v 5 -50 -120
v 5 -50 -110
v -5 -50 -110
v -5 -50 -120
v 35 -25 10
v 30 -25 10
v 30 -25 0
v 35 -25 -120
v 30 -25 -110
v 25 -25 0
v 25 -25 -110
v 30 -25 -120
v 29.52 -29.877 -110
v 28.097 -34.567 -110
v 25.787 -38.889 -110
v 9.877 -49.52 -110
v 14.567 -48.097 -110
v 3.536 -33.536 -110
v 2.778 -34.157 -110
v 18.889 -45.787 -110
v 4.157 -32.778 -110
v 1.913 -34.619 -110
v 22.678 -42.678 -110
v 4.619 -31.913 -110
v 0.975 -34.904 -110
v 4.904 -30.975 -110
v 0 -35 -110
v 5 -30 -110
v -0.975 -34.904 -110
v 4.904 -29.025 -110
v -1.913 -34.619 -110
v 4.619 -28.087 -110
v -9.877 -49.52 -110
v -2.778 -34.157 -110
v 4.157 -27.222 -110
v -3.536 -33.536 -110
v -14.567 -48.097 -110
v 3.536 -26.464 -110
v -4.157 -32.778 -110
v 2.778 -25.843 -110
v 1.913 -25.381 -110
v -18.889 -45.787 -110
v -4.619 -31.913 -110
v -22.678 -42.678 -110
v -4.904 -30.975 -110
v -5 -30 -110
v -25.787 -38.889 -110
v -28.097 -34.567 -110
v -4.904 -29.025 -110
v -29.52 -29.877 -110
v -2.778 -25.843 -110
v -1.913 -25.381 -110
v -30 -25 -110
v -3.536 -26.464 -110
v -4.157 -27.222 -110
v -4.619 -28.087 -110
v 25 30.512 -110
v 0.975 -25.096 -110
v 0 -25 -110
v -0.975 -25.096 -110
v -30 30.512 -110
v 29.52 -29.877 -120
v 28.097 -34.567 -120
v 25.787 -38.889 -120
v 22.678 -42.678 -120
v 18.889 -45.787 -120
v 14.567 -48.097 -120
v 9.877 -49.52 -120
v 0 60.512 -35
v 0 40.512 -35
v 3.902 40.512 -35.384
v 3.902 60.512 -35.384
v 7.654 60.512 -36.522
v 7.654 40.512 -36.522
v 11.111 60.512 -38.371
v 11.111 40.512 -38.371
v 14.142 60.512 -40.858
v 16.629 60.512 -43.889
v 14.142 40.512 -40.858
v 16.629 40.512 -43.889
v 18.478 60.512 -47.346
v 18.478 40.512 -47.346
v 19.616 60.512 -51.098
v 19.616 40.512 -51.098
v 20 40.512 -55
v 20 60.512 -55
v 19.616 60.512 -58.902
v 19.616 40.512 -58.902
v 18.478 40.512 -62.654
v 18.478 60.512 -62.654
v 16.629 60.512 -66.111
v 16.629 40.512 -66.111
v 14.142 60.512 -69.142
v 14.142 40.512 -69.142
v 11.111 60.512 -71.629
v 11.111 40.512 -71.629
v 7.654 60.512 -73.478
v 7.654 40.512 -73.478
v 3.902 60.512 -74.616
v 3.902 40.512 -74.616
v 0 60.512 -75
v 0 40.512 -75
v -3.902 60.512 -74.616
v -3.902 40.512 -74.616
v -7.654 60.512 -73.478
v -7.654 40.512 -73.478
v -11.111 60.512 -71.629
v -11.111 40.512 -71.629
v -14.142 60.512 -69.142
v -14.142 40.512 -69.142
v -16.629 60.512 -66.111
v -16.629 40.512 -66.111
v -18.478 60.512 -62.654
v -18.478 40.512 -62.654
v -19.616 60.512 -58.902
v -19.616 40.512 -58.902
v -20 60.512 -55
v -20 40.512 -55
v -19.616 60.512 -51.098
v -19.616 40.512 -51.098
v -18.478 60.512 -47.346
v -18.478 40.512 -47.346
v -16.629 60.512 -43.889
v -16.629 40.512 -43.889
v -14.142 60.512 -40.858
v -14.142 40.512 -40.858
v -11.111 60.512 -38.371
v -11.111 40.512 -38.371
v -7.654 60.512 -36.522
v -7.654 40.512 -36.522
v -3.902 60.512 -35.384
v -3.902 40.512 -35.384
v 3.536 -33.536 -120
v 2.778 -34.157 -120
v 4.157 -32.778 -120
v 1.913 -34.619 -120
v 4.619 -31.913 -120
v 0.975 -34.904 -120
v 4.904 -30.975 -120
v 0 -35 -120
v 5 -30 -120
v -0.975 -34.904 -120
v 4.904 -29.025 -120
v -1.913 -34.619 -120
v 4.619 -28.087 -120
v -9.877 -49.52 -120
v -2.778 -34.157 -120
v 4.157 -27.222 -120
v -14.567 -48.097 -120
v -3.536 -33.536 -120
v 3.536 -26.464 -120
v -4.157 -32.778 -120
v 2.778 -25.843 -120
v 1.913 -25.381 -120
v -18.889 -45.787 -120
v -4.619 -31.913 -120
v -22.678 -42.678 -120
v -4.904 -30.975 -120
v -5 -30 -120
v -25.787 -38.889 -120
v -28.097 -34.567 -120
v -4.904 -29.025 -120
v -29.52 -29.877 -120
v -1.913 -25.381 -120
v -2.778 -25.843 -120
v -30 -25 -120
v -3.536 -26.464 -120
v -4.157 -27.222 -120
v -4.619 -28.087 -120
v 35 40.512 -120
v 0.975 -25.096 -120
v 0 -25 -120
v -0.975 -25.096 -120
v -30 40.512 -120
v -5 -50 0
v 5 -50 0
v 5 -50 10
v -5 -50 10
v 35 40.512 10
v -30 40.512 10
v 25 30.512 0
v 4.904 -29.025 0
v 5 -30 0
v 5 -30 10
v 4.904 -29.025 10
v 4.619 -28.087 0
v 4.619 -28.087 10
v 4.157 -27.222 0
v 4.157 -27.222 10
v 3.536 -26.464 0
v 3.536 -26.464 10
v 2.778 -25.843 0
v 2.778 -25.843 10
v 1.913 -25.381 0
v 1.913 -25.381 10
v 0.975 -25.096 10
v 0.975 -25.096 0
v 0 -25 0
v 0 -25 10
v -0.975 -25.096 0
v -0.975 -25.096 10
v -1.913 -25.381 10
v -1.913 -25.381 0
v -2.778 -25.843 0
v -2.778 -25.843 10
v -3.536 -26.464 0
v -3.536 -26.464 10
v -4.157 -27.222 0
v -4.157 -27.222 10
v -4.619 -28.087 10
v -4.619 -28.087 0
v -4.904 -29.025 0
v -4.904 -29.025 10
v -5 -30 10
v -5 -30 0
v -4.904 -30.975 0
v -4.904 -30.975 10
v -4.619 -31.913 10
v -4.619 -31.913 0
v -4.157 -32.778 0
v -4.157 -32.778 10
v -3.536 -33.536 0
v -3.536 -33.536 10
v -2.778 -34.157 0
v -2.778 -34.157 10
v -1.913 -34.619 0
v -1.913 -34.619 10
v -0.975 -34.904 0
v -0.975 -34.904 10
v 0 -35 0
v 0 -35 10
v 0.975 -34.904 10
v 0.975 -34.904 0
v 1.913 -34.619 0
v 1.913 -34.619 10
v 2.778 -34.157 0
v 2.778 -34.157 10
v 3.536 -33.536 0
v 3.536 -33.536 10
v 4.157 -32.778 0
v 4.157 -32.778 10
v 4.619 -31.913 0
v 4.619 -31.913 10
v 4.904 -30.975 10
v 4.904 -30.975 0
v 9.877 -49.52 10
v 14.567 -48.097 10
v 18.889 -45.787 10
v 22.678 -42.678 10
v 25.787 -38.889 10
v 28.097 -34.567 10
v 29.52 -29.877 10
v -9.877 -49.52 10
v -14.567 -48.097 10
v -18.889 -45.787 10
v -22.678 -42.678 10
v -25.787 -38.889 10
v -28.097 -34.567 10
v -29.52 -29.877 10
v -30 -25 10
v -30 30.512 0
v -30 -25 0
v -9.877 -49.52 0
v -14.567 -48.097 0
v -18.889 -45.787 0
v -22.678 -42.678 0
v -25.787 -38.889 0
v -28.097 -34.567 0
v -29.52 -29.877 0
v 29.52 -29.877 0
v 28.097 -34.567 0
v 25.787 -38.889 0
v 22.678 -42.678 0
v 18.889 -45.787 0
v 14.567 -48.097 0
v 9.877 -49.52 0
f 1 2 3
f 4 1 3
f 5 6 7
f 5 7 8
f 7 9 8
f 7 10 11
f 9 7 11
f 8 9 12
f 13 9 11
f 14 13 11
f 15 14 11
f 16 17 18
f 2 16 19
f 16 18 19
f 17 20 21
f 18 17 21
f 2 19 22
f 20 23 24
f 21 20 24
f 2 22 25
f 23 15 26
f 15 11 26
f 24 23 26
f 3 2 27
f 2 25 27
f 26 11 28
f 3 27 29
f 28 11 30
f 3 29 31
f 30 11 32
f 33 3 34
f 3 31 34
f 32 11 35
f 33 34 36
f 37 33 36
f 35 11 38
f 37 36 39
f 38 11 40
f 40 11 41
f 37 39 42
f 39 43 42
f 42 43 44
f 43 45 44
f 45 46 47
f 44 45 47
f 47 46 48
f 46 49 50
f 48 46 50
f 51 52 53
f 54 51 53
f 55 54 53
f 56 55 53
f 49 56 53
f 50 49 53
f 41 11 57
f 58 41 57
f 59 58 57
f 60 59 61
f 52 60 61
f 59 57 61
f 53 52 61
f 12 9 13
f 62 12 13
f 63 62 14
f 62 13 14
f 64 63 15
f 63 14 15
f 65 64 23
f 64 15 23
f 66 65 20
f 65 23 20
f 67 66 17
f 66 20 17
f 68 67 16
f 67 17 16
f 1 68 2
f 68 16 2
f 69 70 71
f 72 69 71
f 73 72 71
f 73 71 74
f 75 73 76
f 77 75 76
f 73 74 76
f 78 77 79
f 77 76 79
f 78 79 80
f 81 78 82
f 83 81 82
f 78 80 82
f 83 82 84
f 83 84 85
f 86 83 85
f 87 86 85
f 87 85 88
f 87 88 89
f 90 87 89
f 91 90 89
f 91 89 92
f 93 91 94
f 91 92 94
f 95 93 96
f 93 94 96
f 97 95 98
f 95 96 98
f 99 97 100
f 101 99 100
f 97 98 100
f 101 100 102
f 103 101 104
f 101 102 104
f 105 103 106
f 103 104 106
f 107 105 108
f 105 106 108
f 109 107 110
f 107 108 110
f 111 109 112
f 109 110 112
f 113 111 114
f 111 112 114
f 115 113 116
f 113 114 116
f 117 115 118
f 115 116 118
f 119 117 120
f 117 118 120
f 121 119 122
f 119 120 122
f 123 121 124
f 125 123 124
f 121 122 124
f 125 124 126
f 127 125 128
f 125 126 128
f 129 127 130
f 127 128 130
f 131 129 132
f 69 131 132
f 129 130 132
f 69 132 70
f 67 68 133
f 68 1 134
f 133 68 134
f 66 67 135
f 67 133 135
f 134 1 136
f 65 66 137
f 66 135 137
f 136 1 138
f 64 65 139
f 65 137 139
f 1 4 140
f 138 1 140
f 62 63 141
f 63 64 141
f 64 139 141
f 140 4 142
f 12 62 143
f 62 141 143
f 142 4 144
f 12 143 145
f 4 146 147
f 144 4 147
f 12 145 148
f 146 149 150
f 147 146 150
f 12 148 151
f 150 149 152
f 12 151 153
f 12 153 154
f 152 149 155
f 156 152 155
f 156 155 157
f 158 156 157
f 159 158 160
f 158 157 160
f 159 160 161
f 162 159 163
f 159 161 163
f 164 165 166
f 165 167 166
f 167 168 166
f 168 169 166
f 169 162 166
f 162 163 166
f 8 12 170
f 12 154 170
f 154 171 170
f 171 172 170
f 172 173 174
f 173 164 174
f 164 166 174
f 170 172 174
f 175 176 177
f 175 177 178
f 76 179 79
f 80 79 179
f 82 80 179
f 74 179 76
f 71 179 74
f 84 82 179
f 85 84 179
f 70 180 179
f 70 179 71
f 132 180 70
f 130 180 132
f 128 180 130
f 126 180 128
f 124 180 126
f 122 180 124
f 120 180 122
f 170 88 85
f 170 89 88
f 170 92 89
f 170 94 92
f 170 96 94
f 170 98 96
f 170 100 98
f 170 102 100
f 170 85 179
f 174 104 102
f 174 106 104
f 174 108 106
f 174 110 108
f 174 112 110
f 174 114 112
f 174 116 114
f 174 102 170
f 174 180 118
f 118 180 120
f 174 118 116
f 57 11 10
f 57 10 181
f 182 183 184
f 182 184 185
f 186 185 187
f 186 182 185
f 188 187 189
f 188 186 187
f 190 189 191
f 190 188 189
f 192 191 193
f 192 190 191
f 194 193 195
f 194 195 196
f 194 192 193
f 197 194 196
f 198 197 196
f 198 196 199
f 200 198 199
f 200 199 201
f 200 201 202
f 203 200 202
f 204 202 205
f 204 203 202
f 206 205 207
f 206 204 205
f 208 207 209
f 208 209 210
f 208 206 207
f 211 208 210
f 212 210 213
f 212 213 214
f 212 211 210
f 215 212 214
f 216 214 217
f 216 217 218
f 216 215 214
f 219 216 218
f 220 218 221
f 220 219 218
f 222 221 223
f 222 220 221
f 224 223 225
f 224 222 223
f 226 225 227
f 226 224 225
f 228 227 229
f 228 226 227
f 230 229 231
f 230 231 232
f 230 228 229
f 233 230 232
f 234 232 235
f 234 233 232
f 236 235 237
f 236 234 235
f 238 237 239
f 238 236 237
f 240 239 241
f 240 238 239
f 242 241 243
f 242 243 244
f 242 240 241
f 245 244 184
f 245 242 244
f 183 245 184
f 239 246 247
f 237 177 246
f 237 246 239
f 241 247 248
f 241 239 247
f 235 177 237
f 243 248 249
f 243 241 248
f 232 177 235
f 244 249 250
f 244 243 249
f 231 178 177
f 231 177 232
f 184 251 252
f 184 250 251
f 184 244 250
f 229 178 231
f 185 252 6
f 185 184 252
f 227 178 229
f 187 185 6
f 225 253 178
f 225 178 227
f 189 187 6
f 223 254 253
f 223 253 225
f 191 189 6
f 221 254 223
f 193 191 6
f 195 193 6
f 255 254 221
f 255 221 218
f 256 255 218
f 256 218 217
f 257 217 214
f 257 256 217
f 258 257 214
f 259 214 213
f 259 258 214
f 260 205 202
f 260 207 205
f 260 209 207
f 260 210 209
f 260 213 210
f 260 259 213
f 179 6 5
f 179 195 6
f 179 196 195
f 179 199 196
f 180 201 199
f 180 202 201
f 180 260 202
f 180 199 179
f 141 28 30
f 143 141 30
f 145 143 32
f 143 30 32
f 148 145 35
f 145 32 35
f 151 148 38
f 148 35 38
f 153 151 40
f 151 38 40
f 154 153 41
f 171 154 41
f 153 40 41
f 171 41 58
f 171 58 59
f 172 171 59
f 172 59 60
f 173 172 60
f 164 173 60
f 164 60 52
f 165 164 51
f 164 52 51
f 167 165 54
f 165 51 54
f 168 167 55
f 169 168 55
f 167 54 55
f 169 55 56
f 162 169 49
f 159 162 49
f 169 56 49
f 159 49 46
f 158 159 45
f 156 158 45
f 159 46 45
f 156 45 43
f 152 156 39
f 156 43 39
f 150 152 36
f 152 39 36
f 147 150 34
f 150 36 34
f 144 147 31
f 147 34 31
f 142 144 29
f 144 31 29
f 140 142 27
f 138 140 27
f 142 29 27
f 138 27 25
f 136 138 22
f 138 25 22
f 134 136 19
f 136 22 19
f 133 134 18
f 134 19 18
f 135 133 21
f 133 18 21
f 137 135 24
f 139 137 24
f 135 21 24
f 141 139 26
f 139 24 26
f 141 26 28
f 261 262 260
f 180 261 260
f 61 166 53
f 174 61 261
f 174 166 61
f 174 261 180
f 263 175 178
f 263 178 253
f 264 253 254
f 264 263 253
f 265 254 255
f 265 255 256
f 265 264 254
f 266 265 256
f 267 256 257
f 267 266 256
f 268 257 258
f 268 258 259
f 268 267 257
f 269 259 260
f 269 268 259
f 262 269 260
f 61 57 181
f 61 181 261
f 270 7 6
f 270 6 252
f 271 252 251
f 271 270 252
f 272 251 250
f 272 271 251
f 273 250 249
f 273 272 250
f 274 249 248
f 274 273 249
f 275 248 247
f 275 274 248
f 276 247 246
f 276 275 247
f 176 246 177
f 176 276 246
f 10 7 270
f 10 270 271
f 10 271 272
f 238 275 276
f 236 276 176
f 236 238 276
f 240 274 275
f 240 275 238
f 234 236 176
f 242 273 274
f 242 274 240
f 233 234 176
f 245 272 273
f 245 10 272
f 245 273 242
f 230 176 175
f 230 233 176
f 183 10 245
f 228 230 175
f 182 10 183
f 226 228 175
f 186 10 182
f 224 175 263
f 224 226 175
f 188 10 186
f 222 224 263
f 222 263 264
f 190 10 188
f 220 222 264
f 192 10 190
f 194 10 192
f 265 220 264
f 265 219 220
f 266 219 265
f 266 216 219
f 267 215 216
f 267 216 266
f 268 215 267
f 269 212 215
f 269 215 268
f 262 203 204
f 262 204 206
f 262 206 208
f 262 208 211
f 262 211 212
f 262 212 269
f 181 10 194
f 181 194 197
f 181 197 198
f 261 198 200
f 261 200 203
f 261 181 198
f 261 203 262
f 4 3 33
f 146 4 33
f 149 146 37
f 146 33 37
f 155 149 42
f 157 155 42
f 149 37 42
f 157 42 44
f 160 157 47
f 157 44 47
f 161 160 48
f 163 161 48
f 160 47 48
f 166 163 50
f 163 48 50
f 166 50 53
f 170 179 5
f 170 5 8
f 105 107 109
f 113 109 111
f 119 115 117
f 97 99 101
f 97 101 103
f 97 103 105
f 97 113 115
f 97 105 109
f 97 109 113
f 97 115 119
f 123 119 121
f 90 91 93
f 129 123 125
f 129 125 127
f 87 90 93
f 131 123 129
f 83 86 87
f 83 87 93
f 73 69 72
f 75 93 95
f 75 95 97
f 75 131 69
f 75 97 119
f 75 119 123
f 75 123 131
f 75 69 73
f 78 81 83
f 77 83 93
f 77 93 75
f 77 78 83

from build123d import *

# Parameters (mm, degrees)
SKETCH1_R           = 5
BOSS_EXTRUDE1_DEPTH = 10
BOSS_EXTRUDE2_DEPTH = 55
SKETCH3_R           = 20
BOSS_EXTRUDE3_DEPTH = 20
SKETCH4_W           = 130
SKETCH4_H           = 65.511911844
BOSS_EXTRUDE4_DEPTH = 5


with BuildPart() as part:
    # Sketch1 → Boss-Extrude1 (new body)
    with BuildSketch(Plane.XY):
        with BuildLine():
            Line((-30, 40.511911844), (30, 40.511911844))
            Line((30, 40.511911844), (30, -25))
            ThreePointArc((30, -25), (22.67766953, -42.67766953), (5, -50))
            Line((5, -50), (-5, -50))
            ThreePointArc((-5, -50), (-22.67766953, -42.67766953), (-30, -25))
            Line((-30, -25), (-30, 40.511911844))
        make_face()
        with Locations((0, -30)):
            Circle(SKETCH1_R, mode=Mode.SUBTRACT)
    boss_extrude1 = extrude(amount=BOSS_EXTRUDE1_DEPTH)

    # Sketch2 → Boss-Extrude2 (add)
    with BuildSketch(Plane(origin=(0, 0, 0), x_dir=(-1, 0, 0), z_dir=(0, 0, -1))):
        Polygon((-30, 40.511911844), (-30, -25), (-25, -25), (-25, 30.511911844), (30, 30.511911844), (30, 40.511911844), align=None)
    boss_extrude2 = extrude(amount=BOSS_EXTRUDE2_DEPTH)

    # Mirror1: Boss-Extrude1, Boss-Extrude2 across plane
    add(boss_extrude1.mirror(Plane(origin=(0, 0, -55), x_dir=(1, 0, 0), z_dir=(0, 0, -1))))
    add(boss_extrude2.mirror(Plane(origin=(0, 0, -55), x_dir=(1, 0, 0), z_dir=(0, 0, -1))))

    # Sketch3 → Boss-Extrude3 (add)
    with BuildSketch(Plane(origin=(0, 40.511911844, 0), x_dir=(1, 0, 0), z_dir=(0, 1, 0))):
        with Locations(Location((0, 55, 0), (0, 0, 270))):
            Circle(SKETCH3_R)
    extrude(amount=BOSS_EXTRUDE3_DEPTH)

    # Sketch4 → Boss-Extrude4 (add)
    with BuildSketch(Plane(origin=(30, 0, 0), x_dir=(0, 0, -1), z_dir=(1, 0, 0))):
        with Locations((55, 7.755955922)):
            Rectangle(SKETCH4_W, SKETCH4_H)
    extrude(amount=BOSS_EXTRUDE4_DEPTH)


solid = part.part
